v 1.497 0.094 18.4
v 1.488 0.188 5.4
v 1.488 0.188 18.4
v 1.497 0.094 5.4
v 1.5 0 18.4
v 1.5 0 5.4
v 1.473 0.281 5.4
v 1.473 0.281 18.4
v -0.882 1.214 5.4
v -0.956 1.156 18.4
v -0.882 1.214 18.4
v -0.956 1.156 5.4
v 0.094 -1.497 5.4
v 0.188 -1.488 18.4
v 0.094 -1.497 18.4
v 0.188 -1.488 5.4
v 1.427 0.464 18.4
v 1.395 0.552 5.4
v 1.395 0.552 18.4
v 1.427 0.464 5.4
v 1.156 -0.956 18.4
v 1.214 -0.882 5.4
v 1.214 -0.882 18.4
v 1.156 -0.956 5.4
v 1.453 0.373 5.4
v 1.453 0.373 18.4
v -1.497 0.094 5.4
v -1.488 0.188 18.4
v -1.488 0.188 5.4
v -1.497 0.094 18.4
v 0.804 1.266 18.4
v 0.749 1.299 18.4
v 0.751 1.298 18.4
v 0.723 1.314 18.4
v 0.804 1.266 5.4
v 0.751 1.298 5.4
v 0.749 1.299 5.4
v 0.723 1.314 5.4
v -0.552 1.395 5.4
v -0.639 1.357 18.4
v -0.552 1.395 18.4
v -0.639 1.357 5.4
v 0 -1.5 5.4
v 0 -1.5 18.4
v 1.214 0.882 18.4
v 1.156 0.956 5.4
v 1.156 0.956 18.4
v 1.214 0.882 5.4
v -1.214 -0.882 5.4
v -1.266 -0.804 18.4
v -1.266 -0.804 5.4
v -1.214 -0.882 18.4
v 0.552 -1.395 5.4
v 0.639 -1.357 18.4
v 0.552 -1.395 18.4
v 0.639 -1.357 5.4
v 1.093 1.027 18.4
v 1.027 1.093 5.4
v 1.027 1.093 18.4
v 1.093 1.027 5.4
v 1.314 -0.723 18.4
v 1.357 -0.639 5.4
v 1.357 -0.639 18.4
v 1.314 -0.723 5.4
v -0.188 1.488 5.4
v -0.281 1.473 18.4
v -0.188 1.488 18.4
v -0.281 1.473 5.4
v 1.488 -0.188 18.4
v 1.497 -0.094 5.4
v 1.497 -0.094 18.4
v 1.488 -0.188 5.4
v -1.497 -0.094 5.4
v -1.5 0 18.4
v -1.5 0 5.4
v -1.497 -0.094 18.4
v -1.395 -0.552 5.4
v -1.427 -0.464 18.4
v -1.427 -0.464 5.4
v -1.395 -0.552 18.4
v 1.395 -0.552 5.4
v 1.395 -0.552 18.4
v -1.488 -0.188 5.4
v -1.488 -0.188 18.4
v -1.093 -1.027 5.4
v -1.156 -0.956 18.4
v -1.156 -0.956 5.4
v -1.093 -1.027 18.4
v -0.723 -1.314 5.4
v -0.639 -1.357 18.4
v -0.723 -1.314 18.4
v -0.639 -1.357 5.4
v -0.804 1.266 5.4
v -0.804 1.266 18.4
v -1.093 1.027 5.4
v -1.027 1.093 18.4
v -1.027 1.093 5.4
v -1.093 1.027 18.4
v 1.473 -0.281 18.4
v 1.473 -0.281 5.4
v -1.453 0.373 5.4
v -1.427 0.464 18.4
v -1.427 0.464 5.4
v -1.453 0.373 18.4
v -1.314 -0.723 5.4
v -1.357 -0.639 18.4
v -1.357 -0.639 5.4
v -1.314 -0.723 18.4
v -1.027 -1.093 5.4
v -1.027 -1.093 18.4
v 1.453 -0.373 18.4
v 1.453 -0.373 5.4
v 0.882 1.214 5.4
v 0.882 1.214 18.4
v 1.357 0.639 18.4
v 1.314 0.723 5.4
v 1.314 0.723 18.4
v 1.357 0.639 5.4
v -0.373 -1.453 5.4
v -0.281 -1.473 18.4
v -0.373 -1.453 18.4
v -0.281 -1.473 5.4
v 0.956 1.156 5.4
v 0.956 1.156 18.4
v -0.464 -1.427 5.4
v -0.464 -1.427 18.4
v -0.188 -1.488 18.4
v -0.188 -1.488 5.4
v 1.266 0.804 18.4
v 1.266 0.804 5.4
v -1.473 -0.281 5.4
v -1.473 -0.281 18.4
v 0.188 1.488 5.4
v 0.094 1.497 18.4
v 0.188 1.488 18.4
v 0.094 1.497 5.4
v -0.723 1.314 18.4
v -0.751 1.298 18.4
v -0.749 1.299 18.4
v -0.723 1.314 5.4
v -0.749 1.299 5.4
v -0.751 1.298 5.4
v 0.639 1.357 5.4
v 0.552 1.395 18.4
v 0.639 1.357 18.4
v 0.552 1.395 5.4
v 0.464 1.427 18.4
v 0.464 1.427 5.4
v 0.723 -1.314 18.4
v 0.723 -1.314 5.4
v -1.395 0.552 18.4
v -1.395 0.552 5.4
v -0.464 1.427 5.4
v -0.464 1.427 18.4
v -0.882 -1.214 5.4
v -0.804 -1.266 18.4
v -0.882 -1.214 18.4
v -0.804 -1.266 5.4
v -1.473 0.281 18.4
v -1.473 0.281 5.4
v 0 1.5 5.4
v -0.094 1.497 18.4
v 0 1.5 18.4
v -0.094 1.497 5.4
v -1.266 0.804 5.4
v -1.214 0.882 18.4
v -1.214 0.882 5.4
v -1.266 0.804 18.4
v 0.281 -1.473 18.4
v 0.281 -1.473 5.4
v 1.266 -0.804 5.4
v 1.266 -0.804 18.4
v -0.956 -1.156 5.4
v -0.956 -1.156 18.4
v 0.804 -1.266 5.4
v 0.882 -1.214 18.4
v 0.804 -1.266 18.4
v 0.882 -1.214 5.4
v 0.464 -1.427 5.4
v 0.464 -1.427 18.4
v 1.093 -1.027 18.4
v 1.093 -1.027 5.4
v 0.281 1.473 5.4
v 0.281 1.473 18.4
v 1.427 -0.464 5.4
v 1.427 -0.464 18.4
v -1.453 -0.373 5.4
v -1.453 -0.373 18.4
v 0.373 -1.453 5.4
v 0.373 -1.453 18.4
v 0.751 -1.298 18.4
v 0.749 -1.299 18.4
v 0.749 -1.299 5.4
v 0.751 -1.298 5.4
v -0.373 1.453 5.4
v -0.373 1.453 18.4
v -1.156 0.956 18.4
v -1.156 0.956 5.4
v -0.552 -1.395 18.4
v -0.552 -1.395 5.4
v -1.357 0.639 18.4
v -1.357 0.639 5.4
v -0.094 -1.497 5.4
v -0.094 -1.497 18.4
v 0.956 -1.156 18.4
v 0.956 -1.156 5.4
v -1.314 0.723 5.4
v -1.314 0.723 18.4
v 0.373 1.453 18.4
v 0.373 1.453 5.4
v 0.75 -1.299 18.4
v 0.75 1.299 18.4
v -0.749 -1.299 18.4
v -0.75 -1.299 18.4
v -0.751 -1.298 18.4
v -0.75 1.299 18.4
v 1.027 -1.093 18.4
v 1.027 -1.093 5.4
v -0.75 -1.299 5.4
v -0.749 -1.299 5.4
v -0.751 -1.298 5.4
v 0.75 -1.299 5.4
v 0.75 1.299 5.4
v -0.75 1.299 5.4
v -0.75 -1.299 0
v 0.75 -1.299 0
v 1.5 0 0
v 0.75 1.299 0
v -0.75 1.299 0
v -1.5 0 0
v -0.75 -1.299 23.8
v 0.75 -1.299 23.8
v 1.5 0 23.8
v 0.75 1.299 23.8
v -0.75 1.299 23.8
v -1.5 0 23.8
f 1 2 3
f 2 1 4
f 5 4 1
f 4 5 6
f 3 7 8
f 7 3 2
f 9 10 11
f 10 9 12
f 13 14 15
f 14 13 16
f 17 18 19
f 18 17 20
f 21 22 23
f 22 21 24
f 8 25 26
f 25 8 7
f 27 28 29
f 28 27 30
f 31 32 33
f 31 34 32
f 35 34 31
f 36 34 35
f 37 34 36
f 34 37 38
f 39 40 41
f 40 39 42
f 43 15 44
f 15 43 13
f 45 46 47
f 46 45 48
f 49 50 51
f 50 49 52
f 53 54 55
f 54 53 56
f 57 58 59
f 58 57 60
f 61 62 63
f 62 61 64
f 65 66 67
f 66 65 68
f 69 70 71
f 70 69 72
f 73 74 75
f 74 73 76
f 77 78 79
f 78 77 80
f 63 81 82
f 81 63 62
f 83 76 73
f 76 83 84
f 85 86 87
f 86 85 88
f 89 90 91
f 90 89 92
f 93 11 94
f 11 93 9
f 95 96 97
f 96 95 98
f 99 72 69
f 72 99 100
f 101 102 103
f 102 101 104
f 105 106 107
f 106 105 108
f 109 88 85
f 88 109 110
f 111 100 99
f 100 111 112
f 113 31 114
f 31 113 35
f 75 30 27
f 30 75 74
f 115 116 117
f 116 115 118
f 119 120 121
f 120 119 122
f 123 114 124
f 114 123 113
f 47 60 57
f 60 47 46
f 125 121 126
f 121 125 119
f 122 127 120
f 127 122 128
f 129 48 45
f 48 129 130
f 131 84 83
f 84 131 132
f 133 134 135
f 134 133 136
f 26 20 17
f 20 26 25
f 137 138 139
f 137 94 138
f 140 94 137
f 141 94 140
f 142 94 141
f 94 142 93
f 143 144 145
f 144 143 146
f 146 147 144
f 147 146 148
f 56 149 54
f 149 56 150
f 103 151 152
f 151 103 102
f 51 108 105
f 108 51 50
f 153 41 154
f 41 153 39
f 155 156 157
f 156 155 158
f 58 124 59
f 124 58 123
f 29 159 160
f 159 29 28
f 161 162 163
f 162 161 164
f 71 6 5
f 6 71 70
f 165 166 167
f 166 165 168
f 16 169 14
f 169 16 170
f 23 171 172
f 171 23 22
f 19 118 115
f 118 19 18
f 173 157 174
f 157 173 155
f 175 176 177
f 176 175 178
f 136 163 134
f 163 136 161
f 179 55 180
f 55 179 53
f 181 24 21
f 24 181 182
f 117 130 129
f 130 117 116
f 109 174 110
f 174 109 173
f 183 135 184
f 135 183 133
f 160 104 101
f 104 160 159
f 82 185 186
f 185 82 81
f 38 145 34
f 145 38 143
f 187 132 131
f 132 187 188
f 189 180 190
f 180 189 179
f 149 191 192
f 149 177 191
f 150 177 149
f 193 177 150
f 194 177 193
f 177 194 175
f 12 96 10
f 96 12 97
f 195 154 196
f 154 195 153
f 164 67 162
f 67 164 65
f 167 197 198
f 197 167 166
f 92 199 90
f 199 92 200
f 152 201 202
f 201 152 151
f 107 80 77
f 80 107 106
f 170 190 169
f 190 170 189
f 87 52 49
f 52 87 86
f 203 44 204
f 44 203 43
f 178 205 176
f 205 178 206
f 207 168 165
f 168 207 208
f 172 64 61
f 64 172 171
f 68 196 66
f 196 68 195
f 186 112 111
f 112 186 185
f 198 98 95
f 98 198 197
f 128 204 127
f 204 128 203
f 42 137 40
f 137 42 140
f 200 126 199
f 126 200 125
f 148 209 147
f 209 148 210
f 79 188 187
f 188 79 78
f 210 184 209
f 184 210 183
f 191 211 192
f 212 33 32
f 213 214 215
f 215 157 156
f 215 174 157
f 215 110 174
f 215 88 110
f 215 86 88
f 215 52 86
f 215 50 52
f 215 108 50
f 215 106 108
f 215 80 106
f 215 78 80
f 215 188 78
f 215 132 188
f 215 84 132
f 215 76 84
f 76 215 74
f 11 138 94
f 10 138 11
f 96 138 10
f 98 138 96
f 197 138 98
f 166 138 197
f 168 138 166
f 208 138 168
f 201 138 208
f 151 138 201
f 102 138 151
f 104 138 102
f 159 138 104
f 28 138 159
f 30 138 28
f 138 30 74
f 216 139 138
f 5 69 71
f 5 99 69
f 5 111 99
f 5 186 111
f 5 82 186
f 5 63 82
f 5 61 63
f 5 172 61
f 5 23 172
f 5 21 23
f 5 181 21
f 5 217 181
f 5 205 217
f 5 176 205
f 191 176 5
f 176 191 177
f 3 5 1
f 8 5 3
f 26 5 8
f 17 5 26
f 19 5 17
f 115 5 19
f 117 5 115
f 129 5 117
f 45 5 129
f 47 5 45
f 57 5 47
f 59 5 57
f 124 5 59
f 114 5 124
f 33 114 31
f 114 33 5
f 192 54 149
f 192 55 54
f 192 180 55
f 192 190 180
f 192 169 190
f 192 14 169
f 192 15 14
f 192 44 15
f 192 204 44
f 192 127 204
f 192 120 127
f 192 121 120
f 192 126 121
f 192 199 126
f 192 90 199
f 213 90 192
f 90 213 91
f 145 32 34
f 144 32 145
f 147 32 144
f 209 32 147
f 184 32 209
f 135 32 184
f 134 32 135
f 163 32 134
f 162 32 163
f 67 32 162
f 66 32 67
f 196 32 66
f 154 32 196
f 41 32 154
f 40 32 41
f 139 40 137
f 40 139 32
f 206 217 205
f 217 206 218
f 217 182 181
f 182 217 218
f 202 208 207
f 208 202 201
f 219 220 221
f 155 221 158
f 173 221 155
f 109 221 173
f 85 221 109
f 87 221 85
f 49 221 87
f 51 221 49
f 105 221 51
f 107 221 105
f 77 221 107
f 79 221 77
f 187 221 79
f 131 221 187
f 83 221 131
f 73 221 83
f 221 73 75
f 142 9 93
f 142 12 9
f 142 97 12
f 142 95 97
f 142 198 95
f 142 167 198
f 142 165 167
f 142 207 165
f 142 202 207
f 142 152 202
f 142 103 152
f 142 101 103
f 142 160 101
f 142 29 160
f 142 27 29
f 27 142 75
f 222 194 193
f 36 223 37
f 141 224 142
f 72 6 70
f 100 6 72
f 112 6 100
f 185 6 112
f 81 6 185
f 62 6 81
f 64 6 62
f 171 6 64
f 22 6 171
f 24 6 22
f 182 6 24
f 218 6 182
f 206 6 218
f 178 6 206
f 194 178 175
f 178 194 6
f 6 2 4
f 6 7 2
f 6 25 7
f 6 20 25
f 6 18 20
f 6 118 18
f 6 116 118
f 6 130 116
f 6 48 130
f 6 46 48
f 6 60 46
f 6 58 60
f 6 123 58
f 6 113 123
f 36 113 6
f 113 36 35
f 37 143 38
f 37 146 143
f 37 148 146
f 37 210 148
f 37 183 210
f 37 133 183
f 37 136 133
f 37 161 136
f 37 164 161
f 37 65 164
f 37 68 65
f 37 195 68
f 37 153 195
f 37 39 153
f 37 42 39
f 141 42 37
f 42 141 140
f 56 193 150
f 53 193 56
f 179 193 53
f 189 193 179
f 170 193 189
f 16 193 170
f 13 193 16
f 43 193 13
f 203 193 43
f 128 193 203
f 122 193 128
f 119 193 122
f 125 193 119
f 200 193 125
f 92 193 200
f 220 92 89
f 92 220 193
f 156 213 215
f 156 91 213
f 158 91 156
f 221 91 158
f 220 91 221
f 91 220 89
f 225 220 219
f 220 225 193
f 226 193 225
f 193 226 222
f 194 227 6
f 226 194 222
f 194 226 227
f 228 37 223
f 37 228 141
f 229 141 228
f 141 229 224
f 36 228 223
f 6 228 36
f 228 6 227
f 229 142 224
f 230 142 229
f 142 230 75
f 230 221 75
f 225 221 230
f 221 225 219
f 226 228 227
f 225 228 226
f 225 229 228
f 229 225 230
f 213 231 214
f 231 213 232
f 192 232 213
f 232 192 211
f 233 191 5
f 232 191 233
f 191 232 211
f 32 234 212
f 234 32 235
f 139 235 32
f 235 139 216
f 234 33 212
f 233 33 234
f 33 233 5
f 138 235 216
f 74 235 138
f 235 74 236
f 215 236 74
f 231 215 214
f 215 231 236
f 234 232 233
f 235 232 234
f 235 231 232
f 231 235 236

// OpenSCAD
offset = .5;

union() {

    translate([0,0,5.4]) cylinder(h=13, r1=4/2-offset, r2=4/2-offset,$fn=100);
    cylinder(h=5.4, r1=4/2-offset, r2=4/2-offset,$fn=6);
    translate([0,0,18.4])cylinder(h=5.4, r1=4/2-offset, r2=4/2-offset,$fn=6);
}
